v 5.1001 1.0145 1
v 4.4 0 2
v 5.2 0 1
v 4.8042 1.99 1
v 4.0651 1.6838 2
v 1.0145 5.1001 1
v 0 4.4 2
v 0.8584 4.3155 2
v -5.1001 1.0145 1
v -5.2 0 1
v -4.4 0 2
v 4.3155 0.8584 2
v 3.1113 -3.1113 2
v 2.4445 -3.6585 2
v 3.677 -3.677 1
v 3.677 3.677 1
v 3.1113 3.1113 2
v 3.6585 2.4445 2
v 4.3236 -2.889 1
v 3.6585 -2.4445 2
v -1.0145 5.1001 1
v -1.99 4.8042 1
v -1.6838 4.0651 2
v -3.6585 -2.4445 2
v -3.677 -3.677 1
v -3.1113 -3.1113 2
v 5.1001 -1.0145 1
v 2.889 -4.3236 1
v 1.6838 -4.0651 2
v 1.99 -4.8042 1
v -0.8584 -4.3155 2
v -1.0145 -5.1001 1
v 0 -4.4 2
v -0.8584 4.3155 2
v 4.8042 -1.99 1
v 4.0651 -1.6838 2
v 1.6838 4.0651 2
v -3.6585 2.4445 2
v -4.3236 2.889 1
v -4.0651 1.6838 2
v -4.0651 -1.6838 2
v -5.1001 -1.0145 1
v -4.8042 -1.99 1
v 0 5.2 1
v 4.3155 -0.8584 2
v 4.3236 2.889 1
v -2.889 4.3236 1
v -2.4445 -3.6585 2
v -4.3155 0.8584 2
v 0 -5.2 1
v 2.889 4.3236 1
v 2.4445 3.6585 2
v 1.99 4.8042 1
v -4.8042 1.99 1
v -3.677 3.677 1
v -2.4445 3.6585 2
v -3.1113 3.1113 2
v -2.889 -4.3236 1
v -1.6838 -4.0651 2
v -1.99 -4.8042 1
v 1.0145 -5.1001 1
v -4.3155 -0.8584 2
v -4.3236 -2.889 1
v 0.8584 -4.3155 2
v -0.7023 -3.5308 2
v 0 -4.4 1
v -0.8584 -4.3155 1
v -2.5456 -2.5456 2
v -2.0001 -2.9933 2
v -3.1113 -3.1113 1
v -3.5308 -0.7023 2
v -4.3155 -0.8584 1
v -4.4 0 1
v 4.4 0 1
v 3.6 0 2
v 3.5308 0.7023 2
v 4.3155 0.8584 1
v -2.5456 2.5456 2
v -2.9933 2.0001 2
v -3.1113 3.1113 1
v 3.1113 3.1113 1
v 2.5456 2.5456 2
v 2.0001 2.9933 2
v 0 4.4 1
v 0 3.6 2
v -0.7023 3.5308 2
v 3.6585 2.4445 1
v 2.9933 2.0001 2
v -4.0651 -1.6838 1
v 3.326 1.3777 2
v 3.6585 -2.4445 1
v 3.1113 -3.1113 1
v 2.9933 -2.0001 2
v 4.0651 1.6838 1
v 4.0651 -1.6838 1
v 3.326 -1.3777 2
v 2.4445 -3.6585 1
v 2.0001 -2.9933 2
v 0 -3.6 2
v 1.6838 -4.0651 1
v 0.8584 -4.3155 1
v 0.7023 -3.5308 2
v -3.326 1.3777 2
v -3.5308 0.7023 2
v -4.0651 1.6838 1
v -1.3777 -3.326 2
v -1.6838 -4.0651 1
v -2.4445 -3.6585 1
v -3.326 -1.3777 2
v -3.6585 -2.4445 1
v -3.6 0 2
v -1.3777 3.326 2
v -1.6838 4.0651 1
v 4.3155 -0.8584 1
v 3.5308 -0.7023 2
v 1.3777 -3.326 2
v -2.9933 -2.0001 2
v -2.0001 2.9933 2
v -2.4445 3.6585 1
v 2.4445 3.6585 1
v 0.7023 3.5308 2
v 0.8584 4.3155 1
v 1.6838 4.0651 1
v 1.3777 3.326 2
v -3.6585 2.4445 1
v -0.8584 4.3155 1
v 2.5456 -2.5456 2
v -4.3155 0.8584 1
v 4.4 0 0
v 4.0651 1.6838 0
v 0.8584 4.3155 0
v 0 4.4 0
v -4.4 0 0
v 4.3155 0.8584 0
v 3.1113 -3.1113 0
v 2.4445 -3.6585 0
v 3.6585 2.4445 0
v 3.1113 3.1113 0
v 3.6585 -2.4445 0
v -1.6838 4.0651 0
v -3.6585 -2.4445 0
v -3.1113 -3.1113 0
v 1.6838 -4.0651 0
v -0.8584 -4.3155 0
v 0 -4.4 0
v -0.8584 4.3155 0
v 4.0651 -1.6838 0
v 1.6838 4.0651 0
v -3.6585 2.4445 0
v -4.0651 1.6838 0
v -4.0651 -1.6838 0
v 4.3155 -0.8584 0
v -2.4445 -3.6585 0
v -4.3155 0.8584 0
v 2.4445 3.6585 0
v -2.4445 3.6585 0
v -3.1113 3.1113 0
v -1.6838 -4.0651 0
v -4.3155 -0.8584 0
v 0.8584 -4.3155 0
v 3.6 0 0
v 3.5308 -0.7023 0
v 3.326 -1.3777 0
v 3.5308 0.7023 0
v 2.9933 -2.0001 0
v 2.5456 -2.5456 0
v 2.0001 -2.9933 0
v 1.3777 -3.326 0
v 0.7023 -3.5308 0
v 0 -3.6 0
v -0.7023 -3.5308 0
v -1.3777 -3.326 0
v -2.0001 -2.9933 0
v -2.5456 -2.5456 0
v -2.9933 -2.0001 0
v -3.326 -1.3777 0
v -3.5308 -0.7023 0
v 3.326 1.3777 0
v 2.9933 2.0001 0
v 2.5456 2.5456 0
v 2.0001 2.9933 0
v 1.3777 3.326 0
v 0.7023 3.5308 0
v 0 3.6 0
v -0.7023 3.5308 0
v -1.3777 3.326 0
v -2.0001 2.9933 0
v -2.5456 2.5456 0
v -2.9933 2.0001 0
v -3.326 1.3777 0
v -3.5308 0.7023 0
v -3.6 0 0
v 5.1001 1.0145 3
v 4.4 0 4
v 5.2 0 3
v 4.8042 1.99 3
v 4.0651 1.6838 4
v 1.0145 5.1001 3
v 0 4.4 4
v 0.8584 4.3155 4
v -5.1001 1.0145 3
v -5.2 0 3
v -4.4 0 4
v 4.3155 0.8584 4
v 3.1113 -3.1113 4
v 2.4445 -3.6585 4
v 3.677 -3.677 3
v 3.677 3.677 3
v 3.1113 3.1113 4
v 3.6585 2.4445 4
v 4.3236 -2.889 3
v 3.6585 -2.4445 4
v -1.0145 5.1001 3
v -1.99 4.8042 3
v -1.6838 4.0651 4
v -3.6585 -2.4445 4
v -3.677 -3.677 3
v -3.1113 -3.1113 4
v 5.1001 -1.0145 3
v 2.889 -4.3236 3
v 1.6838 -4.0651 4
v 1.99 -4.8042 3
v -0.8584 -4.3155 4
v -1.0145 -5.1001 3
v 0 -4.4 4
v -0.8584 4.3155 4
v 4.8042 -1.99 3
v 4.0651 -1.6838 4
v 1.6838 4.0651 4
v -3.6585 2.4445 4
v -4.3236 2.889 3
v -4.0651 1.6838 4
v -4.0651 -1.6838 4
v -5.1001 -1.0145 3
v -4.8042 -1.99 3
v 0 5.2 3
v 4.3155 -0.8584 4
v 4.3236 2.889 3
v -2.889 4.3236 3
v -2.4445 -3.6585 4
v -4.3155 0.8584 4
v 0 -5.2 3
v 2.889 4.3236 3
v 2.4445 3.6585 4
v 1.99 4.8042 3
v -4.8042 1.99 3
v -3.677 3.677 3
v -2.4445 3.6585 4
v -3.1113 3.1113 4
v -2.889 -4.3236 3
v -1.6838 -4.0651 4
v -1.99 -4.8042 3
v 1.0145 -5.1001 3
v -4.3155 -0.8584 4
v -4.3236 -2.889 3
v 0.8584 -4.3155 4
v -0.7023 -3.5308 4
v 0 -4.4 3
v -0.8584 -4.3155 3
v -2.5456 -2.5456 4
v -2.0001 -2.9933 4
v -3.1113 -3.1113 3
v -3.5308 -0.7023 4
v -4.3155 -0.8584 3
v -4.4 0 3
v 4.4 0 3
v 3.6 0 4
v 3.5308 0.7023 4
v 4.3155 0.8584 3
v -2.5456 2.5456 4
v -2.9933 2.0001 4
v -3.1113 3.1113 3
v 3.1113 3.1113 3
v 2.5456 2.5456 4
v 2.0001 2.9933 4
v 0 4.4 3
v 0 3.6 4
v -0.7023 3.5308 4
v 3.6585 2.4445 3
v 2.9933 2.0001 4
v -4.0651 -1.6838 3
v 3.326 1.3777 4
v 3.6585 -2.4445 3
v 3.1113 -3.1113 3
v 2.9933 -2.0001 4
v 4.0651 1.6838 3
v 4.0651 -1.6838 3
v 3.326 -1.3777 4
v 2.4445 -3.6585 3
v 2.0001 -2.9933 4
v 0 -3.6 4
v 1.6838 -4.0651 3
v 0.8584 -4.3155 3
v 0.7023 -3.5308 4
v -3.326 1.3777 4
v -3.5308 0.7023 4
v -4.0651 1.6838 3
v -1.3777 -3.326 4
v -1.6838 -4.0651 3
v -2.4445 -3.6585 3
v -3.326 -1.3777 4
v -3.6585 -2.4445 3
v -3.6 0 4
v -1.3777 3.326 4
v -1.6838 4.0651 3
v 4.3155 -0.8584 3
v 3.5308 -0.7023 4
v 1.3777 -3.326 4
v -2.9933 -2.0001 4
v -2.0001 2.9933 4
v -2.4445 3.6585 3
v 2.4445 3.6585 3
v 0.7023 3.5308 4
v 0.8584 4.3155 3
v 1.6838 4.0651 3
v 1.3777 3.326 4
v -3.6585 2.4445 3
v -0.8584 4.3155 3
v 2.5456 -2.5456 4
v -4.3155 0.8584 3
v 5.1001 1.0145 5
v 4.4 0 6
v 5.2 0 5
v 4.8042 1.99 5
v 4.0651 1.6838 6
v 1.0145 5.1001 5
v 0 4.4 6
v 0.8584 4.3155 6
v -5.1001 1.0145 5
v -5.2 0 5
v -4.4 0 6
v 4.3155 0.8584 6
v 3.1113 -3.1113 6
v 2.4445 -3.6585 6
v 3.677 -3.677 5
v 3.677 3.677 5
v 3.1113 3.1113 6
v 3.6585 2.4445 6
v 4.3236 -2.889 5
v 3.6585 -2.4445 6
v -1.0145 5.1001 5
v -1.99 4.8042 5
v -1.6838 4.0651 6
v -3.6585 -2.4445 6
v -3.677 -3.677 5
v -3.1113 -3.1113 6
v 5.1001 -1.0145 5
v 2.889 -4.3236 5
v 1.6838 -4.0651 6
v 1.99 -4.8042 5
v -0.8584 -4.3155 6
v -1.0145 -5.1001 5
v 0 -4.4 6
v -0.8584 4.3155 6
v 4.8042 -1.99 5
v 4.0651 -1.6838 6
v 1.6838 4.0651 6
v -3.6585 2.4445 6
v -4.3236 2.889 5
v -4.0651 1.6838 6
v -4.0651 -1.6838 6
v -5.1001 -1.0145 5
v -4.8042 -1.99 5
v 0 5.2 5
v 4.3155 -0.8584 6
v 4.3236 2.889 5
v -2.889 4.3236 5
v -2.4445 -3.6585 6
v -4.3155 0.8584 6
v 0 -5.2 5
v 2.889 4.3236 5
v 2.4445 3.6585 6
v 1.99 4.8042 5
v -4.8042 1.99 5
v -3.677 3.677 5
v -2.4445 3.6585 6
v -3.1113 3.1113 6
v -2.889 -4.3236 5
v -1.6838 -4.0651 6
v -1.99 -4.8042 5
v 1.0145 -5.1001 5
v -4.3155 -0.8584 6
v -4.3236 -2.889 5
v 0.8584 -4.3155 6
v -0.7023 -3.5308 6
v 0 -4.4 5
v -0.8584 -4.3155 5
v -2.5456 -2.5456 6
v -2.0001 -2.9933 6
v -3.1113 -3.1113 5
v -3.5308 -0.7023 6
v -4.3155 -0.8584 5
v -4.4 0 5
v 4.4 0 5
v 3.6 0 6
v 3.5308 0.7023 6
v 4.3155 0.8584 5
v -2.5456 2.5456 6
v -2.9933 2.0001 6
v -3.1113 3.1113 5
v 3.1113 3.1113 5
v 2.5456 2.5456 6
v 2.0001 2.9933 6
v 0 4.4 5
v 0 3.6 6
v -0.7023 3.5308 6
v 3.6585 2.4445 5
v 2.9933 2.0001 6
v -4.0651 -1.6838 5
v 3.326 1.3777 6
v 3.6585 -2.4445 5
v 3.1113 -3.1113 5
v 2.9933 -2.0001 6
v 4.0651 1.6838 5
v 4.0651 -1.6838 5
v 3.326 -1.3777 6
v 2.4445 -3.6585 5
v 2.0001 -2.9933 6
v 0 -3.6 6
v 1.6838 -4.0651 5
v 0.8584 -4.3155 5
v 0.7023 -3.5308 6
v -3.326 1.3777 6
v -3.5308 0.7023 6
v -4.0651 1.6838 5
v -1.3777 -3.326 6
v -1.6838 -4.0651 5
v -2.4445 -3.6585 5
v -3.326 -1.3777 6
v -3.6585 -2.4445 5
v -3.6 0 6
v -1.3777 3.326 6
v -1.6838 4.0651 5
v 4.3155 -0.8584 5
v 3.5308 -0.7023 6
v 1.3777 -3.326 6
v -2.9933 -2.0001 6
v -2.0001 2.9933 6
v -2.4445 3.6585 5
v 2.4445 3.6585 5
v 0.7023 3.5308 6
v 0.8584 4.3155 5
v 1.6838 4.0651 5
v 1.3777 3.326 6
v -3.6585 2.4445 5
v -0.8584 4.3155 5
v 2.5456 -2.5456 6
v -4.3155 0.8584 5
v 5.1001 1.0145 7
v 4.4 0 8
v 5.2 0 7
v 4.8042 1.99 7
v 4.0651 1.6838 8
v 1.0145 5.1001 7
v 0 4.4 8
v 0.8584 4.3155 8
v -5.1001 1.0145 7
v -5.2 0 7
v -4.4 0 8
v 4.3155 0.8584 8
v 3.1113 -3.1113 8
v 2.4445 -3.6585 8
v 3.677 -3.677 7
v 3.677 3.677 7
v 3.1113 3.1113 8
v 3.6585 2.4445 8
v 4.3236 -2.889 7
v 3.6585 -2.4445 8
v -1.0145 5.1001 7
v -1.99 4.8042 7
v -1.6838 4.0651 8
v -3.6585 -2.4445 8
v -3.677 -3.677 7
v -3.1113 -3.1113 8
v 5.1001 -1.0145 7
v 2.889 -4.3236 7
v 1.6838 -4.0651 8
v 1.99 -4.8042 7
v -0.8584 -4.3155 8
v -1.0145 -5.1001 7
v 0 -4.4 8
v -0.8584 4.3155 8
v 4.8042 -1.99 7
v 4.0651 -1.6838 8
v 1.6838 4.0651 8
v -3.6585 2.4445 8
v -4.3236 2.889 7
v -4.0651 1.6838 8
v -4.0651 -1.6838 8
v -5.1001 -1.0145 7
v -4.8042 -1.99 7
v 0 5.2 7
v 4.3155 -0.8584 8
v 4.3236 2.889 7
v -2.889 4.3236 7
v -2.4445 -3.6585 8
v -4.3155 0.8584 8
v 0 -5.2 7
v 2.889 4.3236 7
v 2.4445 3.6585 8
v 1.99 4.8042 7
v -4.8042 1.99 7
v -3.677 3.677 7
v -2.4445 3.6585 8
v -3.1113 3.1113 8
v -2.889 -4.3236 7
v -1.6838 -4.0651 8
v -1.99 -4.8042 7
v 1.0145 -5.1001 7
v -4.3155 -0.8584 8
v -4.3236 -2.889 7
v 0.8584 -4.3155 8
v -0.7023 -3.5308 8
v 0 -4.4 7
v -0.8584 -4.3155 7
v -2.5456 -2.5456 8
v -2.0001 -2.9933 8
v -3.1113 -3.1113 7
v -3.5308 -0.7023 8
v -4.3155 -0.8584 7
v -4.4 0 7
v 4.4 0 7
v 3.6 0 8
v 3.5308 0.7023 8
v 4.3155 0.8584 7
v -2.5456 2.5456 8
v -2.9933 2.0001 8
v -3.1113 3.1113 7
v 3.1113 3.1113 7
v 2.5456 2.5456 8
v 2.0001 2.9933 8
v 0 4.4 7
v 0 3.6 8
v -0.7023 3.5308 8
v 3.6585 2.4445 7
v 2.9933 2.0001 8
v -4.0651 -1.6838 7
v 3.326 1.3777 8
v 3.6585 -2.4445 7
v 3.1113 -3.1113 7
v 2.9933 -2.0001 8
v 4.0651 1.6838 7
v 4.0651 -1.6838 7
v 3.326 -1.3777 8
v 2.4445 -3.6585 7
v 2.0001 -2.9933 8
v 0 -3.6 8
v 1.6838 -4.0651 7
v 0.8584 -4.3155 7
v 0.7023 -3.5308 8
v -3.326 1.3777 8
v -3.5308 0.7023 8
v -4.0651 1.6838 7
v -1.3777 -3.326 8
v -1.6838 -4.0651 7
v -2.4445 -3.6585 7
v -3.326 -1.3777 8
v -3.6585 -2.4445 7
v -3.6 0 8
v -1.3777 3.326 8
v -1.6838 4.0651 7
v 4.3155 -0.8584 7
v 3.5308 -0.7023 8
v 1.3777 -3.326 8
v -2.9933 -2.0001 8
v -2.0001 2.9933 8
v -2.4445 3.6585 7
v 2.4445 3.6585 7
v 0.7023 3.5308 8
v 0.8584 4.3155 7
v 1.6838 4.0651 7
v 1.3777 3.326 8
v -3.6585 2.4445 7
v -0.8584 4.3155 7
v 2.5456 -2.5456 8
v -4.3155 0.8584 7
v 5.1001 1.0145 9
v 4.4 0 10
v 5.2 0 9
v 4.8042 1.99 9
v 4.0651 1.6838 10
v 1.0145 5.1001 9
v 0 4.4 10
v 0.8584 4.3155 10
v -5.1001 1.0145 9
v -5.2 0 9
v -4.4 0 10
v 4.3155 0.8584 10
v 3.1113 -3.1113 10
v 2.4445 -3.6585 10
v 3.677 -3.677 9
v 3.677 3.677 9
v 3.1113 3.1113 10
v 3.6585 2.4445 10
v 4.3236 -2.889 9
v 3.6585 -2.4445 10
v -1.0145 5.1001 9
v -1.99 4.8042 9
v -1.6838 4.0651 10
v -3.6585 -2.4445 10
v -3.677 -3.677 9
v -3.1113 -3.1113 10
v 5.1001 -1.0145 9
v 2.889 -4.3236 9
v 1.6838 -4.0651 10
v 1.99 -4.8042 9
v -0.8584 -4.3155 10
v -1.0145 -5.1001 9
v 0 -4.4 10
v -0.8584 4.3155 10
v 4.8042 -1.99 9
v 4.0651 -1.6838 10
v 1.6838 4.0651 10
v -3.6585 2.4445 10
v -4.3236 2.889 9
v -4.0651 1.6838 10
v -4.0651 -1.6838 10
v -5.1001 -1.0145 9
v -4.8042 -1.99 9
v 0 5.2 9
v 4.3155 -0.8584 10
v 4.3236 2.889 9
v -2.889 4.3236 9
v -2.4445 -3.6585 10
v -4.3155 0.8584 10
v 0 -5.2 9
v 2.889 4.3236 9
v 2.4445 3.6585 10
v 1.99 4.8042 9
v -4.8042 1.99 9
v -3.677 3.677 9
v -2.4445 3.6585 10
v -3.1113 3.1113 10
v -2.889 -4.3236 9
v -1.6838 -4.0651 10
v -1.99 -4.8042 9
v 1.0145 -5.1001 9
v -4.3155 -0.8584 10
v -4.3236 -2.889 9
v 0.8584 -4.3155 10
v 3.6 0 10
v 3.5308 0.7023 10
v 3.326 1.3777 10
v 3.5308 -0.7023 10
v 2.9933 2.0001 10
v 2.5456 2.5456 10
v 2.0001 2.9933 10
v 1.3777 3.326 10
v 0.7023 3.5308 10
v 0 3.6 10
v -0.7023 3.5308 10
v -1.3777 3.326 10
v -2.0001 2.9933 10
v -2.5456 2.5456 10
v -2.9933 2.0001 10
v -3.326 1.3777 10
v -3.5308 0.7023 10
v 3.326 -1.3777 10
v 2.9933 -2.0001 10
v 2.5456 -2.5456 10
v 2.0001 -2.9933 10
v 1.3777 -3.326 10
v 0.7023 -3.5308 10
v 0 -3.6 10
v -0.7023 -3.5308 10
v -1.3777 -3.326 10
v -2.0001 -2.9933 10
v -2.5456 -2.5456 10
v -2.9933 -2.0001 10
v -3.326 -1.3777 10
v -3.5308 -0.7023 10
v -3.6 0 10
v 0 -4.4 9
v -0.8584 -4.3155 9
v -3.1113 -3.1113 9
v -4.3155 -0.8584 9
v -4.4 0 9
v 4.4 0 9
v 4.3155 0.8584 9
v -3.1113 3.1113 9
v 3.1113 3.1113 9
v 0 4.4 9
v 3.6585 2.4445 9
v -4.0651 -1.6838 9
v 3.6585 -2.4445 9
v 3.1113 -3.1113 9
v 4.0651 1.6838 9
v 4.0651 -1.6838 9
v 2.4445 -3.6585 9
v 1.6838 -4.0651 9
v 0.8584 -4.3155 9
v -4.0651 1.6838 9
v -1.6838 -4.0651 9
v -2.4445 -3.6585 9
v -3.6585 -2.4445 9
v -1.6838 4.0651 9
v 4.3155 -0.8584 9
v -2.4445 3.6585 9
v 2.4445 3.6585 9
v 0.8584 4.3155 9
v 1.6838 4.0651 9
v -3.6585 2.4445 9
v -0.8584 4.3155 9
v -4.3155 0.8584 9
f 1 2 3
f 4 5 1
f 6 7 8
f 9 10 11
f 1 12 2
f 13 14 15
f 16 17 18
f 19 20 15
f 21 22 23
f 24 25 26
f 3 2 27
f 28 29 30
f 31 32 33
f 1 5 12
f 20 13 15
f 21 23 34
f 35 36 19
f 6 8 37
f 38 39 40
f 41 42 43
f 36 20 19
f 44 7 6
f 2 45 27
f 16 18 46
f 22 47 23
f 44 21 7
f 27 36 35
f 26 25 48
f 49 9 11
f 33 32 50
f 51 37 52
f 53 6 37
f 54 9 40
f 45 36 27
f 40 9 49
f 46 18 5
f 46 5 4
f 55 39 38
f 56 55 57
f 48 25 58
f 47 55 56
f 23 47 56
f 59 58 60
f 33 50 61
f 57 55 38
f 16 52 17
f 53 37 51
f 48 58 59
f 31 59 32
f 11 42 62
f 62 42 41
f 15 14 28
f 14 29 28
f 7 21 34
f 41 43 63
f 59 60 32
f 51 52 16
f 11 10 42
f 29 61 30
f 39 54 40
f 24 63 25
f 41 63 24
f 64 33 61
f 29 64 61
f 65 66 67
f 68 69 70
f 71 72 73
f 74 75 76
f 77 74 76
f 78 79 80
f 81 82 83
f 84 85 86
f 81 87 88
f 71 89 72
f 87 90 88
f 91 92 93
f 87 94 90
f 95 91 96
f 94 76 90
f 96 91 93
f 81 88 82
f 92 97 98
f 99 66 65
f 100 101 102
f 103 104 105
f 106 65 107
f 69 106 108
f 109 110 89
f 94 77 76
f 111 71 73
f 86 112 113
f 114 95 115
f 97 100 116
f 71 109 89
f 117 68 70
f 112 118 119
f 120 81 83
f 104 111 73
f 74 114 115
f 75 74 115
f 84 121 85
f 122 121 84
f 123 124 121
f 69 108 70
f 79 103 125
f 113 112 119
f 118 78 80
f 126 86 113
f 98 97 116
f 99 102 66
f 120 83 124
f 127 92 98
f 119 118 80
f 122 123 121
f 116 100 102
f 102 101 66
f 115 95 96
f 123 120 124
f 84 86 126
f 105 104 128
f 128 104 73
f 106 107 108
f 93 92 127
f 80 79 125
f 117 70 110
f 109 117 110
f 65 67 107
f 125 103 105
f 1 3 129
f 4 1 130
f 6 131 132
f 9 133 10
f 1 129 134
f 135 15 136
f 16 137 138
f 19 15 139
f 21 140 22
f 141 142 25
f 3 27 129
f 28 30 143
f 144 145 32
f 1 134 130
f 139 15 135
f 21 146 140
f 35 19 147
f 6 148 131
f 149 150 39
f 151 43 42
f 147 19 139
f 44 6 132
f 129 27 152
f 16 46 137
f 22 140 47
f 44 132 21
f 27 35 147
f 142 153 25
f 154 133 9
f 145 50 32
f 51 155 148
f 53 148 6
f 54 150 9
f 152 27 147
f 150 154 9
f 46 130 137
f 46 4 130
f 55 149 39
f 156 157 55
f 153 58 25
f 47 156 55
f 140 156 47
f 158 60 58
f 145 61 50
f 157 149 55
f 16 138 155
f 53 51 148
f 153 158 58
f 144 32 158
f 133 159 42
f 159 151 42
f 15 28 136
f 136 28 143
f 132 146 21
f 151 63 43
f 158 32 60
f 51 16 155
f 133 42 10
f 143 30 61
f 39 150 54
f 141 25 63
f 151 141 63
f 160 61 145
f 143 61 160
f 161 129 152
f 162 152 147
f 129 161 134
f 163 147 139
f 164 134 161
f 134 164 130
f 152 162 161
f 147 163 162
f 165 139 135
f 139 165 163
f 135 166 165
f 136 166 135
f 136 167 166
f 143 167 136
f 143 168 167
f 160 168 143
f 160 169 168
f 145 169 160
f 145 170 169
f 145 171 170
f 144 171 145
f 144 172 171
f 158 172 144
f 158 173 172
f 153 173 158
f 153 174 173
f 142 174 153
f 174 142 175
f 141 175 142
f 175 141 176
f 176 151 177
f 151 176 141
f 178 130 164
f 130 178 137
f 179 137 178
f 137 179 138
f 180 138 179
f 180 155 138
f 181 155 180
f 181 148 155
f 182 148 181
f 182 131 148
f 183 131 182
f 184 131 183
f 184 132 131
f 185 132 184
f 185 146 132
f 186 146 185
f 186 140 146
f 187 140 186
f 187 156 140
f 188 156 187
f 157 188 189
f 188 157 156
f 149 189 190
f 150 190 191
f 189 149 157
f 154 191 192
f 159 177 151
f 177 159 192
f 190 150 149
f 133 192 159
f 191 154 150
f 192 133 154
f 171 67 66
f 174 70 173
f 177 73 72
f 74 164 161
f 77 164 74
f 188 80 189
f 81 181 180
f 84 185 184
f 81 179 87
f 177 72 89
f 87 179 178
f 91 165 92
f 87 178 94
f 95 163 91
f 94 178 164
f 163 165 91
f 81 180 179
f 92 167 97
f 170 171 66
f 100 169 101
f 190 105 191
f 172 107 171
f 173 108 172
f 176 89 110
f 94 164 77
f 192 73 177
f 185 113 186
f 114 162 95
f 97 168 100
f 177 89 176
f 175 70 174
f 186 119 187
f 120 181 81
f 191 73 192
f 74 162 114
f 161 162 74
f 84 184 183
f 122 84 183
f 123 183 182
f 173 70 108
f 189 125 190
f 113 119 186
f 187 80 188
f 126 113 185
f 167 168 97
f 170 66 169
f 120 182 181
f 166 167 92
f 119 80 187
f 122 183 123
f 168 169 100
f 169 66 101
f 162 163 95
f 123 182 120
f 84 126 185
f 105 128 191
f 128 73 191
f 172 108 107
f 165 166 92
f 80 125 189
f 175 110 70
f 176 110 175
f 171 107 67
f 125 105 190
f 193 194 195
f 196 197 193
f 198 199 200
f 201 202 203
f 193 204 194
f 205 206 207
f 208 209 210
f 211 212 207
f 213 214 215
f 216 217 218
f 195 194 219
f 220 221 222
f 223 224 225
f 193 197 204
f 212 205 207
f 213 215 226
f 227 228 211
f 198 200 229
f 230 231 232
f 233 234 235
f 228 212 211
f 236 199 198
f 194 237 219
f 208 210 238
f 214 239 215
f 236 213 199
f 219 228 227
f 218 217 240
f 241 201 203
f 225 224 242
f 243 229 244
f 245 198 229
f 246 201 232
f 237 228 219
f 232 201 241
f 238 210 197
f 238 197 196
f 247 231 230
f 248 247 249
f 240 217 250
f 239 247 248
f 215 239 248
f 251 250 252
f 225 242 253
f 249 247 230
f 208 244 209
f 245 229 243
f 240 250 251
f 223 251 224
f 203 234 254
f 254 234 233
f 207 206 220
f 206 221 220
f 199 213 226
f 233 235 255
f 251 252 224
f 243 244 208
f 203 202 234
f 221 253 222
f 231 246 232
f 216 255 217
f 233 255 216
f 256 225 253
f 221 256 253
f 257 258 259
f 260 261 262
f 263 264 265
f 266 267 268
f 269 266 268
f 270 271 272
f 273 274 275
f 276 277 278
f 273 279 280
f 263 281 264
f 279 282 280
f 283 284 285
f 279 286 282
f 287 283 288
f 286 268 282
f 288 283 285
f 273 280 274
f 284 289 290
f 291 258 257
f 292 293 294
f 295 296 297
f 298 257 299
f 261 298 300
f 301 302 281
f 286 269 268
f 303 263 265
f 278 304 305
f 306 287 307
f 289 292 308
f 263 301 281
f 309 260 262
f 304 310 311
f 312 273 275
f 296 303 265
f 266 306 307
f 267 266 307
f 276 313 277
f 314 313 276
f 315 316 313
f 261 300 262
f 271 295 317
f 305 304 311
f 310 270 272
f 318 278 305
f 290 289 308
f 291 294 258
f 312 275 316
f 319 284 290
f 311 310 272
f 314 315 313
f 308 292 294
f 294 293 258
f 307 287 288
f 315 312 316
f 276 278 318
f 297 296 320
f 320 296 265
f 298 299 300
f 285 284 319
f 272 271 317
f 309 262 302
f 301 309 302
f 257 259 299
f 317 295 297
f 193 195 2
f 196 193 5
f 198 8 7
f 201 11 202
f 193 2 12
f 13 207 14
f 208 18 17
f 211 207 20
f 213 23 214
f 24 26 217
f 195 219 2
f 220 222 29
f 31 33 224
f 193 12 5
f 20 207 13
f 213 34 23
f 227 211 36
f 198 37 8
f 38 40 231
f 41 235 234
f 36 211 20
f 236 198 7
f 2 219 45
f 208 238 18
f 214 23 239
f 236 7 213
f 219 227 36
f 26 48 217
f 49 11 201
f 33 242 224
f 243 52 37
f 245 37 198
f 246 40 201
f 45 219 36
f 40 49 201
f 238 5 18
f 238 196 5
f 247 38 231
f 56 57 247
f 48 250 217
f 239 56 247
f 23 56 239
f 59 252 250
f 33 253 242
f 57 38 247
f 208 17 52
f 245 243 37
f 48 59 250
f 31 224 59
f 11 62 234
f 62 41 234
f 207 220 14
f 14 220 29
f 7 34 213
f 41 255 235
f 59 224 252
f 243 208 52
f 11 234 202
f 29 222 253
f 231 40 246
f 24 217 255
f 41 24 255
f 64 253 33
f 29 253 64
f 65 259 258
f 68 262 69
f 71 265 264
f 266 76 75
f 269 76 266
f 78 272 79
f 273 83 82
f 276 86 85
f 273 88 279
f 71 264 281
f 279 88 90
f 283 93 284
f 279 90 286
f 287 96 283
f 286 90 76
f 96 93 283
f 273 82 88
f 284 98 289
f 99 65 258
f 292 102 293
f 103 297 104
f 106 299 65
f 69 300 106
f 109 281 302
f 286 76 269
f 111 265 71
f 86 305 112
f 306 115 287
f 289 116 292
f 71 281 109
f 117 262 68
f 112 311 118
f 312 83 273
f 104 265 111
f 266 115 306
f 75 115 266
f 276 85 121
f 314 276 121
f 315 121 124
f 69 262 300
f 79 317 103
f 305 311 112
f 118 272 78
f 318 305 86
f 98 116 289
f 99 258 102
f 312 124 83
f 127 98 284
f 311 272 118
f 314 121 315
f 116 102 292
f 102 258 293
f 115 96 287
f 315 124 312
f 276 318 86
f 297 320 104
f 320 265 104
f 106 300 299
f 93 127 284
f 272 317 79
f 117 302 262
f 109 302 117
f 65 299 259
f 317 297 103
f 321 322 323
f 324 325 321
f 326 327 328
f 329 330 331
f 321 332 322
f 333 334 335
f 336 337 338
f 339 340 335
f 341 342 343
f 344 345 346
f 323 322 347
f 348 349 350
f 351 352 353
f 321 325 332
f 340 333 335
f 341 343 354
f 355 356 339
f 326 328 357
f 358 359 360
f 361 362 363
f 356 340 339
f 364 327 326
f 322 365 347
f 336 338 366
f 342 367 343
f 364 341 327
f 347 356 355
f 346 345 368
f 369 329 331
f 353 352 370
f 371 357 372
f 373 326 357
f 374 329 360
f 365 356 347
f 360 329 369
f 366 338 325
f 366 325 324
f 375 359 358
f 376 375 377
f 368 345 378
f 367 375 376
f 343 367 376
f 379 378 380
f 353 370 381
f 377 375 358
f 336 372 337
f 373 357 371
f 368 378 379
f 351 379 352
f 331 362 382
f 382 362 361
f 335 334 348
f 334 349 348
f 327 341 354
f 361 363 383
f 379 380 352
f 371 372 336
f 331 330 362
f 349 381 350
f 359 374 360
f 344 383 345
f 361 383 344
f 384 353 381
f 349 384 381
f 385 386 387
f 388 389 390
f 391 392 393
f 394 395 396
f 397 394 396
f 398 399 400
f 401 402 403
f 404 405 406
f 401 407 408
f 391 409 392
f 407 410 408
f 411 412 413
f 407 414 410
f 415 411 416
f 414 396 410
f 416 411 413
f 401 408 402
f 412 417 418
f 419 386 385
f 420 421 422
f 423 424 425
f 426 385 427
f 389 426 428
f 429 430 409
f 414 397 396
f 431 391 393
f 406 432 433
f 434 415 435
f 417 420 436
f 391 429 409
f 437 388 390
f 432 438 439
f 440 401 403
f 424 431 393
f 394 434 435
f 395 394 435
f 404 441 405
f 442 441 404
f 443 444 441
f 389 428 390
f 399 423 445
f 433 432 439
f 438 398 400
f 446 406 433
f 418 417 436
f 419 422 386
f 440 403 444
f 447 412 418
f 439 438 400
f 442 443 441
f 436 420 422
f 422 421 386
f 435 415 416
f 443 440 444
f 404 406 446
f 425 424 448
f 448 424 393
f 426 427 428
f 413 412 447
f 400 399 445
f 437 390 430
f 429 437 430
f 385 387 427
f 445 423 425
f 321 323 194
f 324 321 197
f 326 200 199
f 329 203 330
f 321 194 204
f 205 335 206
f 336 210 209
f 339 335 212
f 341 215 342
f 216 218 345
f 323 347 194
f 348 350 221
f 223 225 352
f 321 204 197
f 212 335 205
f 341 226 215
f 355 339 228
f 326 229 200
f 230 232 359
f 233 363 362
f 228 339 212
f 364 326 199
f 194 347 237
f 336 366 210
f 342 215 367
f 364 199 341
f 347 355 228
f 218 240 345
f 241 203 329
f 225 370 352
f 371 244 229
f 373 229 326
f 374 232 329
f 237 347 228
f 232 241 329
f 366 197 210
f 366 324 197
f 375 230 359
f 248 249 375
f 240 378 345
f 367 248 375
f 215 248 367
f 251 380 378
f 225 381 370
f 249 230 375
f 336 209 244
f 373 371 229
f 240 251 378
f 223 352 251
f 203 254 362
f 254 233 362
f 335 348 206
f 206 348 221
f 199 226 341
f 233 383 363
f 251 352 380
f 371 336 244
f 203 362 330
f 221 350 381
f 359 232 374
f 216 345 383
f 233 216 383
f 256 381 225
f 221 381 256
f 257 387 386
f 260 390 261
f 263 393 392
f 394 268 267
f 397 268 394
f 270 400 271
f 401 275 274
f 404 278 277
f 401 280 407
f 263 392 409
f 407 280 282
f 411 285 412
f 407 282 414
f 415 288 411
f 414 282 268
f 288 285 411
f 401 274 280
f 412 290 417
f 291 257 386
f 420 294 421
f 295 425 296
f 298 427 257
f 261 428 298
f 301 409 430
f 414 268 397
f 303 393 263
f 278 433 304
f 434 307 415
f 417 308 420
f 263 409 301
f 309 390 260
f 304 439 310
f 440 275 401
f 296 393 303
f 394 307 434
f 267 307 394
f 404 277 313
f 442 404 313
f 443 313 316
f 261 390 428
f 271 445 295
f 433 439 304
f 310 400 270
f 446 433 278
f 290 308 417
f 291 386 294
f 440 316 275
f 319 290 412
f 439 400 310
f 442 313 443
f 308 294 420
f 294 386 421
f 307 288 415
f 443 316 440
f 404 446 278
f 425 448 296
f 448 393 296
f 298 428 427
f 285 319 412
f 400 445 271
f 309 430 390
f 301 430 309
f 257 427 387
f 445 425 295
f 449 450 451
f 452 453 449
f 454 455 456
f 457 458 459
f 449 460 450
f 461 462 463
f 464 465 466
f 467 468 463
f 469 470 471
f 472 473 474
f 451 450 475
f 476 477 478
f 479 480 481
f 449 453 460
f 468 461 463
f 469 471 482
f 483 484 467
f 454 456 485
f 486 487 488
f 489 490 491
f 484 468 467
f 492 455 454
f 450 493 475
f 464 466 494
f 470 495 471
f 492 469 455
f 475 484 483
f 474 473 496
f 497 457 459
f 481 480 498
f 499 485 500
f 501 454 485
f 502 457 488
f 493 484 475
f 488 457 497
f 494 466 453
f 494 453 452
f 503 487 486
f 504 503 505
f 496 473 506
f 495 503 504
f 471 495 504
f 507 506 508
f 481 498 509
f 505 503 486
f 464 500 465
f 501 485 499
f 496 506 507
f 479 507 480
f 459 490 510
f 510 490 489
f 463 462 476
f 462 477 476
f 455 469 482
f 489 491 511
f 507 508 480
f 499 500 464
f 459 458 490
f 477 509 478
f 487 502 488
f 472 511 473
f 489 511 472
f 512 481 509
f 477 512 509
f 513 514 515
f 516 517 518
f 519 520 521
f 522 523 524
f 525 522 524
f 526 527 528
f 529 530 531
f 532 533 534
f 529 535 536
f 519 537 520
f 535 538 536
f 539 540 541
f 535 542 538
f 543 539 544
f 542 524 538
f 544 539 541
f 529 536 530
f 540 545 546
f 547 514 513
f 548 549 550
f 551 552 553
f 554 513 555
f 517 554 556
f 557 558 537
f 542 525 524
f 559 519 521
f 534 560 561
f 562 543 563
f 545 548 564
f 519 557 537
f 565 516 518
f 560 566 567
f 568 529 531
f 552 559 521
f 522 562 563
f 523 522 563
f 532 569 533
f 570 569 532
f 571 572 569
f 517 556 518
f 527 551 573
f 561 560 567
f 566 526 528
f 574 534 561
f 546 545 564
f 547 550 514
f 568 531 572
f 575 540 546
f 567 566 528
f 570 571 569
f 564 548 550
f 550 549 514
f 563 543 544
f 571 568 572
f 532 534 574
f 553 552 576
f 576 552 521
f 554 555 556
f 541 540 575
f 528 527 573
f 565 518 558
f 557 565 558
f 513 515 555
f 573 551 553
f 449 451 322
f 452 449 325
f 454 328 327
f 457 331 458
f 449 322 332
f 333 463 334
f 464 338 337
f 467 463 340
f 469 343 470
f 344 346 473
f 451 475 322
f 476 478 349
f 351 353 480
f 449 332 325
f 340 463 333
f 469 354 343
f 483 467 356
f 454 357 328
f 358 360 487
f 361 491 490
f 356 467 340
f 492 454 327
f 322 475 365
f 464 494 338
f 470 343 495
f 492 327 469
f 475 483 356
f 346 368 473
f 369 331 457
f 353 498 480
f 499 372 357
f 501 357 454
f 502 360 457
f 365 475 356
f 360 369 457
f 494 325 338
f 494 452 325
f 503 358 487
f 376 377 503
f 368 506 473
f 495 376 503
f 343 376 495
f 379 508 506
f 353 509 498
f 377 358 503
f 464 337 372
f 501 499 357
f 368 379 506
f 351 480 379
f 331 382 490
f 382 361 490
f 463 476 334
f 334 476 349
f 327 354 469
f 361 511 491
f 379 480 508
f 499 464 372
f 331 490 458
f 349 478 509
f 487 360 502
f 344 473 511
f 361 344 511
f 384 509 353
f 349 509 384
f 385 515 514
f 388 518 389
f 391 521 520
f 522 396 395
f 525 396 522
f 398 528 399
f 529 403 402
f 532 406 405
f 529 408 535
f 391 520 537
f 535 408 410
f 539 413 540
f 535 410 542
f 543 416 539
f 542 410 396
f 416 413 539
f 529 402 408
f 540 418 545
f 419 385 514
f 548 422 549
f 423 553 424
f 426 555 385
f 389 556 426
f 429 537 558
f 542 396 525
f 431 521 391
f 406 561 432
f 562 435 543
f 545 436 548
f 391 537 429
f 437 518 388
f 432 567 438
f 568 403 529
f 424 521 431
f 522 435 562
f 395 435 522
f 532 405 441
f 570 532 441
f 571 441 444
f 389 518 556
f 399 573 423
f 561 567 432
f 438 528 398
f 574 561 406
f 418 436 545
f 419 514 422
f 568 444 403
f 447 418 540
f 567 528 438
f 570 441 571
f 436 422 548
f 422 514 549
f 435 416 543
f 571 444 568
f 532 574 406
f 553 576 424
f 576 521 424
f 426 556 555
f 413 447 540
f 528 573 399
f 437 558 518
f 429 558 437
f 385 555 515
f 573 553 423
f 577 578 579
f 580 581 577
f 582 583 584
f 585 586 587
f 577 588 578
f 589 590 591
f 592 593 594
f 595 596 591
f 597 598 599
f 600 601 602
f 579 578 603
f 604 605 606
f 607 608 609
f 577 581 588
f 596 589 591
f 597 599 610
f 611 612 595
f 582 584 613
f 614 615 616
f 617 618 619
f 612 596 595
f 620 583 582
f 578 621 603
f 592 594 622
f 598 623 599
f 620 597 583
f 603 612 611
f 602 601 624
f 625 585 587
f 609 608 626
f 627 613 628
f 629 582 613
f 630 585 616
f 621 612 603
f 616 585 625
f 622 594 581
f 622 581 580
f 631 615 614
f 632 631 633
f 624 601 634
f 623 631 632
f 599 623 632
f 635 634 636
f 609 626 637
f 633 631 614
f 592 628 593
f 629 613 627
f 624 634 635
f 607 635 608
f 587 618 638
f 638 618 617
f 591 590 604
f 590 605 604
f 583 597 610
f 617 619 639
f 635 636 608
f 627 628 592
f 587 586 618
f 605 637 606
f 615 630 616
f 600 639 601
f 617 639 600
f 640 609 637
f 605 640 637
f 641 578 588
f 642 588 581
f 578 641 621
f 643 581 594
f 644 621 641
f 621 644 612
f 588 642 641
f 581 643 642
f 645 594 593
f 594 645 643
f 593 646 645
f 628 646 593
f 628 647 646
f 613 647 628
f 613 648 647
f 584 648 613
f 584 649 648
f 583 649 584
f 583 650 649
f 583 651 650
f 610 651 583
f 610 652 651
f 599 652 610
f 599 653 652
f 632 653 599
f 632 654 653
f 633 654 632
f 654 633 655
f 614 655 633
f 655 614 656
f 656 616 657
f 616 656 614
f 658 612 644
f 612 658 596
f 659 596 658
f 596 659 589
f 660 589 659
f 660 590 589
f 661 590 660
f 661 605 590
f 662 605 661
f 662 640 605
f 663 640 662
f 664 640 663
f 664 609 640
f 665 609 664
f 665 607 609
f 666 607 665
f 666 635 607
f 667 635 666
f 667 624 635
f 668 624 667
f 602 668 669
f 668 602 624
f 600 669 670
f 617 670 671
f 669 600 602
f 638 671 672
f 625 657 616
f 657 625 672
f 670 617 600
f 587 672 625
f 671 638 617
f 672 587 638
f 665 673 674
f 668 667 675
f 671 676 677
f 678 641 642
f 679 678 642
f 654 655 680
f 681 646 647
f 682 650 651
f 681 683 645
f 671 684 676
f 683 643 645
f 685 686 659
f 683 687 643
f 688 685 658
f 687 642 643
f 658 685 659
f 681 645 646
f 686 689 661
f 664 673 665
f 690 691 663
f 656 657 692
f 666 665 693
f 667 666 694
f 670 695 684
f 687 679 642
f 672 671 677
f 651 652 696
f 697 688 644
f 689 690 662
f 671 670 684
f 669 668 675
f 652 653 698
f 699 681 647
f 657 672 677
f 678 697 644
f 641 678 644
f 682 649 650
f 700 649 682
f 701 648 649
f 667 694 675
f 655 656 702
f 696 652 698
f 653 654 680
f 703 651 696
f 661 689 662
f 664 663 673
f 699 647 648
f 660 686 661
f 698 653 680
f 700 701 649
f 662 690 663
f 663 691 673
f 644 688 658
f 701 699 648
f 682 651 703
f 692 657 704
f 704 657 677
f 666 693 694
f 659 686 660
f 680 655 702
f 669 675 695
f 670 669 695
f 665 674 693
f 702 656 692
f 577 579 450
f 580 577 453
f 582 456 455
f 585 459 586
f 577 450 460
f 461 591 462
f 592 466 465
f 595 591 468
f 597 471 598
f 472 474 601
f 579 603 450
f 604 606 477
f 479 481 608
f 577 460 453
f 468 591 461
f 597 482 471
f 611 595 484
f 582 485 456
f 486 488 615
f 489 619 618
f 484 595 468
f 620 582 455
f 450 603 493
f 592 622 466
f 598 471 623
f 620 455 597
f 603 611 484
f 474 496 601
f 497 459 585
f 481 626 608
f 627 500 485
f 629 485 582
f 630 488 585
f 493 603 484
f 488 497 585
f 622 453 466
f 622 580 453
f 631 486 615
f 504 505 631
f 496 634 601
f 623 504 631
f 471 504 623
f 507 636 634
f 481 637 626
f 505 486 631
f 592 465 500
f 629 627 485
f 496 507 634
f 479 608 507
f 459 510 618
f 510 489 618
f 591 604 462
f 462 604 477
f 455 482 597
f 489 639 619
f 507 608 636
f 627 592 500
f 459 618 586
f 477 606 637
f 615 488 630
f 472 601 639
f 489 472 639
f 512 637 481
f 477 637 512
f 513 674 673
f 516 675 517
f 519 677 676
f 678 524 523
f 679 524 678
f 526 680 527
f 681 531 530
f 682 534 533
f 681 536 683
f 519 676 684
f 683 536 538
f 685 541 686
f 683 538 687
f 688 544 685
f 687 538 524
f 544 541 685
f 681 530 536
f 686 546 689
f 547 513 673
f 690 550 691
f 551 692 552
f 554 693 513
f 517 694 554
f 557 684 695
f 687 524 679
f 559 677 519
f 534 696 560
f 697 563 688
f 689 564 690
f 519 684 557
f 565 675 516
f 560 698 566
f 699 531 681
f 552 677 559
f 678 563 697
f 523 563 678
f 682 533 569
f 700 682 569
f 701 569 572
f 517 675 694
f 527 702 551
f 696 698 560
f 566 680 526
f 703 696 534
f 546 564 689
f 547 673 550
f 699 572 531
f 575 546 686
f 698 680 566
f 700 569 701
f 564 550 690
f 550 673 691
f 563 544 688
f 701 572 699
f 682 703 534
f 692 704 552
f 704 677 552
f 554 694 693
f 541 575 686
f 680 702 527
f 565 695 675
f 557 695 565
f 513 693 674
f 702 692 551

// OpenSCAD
// file: tpu_springs.scad
// TPU spring

//$fn=32;

module hollowCylinder(od, id, h, thick) {
    assert(id>thick*2);
    difference() {
        // Outer wall
        cylinder(d1=od, d2=id+thick*2, h);
        // Inner wall
        cylinder(d1=od-thick*2, d2=id, h);
    }
}


module rib(od, id, h, thick) {
    translate([0,0,h/2]) {
        hollowCylinder(od,id,h/2,thick);
        mirror([0,0,1])
        hollowCylinder(od,id,h/2,thick);
    }
}

module tpuSpring(od, id, h, thick, num_ribs) {
    rib_h = h/num_ribs;
    for (i=[0:num_ribs-1]) {
        translate([0,0,i*rib_h])
        rib(od, id, rib_h, thick);
    }
}
//tpuSpring(20, 10, 50, 2, 10);
// file: fillets.scad
// Fillets


// Creates a 3D fillet using rotate_extrude.
// Parameters:
//   fillet_rad — fillet radius
//   center_rad — distance from rotation center
//   inward     — mirror horizontally (true = inward, false = outward)
//   upward     — mirror vertically (true = upward, false = downward)
//   scl        — vertical scale factor
module fillet(fillet_rad, center_rad, inward = true, upward = true, scl = 1.0) {
    // Determine mirror axes
    mirror_vec = [
        inward ? 1 : 0,   // mirror X if inward
        upward ? 0 : 1    // mirror Y if downward
    ];

    // Assumes $fn is set externally
    scale([1, 1, scl])
    rotate_extrude()
    translate([center_rad, 0])
    translate([fillet_rad / 2, fillet_rad / 2])
    mirror(mirror_vec)
    translate([-fillet_rad / 2, -fillet_rad / 2])
    intersection() {
        difference() {
            square(fillet_rad * 2, center = true);
            circle(r = fillet_rad);
        }
        square(fillet_rad);
    }
}

// Example usage
fillet(2, 2, inward = false, upward = false, scl = 0.5);


//newCircularInwardFillet3D(2, 2, up=true, step=32, scl=0.5);
// main file
// Ender 3 Pro Pen Plotter Tool

use <fillets.scad>;
use <tpu_springs.scad>;

$fn=32;

ptfe_dia = 4.21;
spring_inner_dia = 6.4;//7.0; // ~0.1 less than actual
pen_shaft_dia = 3.22+0.4; // Actual was ~2.96, but we want free sliding
pen_insert_dia = 4.1; // Actual was ~3.93, but we don't want too tight
pen_insert_len = 9.55;
pen_head_dia = 5.65;
desired_spring_len = 10.0;//16.0; // Force felt good here
min_spring_len = 4.5;//7.0; // As far as we're comfortable
rod_dia = 2.15+0.4; // Actual was 2.0
min_rod_len = (49.9-2.9)/2; // The total length we have to work with (try for less?)

m3_shaft_len = 10.0;
m3_shaft_dia = 3.0;
m3_head_dia = 5.3;
m3_head_len = 3.0+10.0;

wall_thick = 1.6;
rounding = 3.0;
fillet_rad = 1.0;
lid_unoffset = 3.0;
screw_spot_len = m3_shaft_len;
lid_extra_offset = 1.5;

mount_hole_bed_dist = 45.5;
pen_head_len = 10.0;
pen_out_dist = pen_head_len-wall_thick;
pen_squish_amount = 2.0;
mount_hole_rod_dia = 4.7;
mount_screw_hole_dist=14.4;
mount_hole_rod_len = 4.5;
//screw_hole_dia=3.0;


num_rods = 3;

slider_case_spacing = 0.4;

slider_dia = 26.0;
slider_len = min_rod_len-desired_spring_len-2*wall_thick;
//echo(slider_len);

//#linear_extrude(slider_len+2)
//circle(d=8.6);

module sliderSolid2D(unoffset=0.0) {
    offset(rounding-unoffset) offset(-rounding+unoffset)
    circle(d=slider_dia, $fn=num_rods);
}

module ptfeHoles2D() {
    for (i=[0:num_rods-1]) {
        rotate([0,0,i*360/num_rods])
        translate([slider_dia/4,0])
        circle(d=ptfe_dia);
    }
}

module rodHoles2D() {
    for (i=[0:num_rods-1]) {
        rotate([0,0,i*360/num_rods])
        translate([slider_dia/4,0])
        circle(d=rod_dia);
    }
}

module penHole2D() {
    circle(d=pen_insert_dia);
}

module sliderLower3D() {
    linear_extrude(pen_insert_len)
    difference() {
        sliderSolid2D();
        ptfeHoles2D();
        circle(d=pen_insert_dia);
    }
    fil_rad = pen_insert_dia/2-pen_shaft_dia/2;
    translate([0,0,pen_insert_len-fil_rad])
    fillet(fil_rad, pen_shaft_dia/2, false, true);
    //#fillet(pen_insert_dia-pen_shaft_dia, pen_shaft_dia, false, true);
}
//sliderLower3D();

module sliderUpper3D() {
    linear_extrude(slider_len-pen_insert_len)
    difference() {
        sliderSolid2D();
        ptfeHoles2D();
        circle(d=pen_shaft_dia);
    }
}

module sliderSpringNub() {
    linear_extrude(min_spring_len/2)
    difference() {
        circle(d=spring_inner_dia);
        circle(d=pen_shaft_dia);
    }
    fillet(fillet_rad, spring_inner_dia/2, true, false);
}

module slider3D() {
    translate([0,0,slider_len])
    sliderSpringNub();
    translate([0,0,pen_insert_len])
    sliderUpper3D();
    sliderLower3D();
}
//translate([0,0,wall_thick])
//slider3D();

module sliderCaseSolid2D(unoffset=0.0) {
    offset(wall_thick+slider_case_spacing)
    sliderSolid2D(unoffset);
}
//#sliderCaseSolid2D();

module sliderCaseWalls2D() {
    difference() {
        sliderCaseSolid2D();
        offset(-wall_thick)
        sliderCaseSolid2D();
    }
}
//#sliderCaseWalls2D();

module sliderCaseScrewSpots() {
    translate([0,0,min_rod_len-wall_thick-screw_spot_len]) {
        hull() {
            linear_extrude(screw_spot_len)
            sliderCaseSolid2D(lid_unoffset);
            translate([0,0,-lid_unoffset])
            linear_extrude(0.01)
            sliderCaseSolid2D();
        }
        hull() {
            translate([0,0,-0.01+screw_spot_len])
            linear_extrude(0.01)
            offset(lid_extra_offset)
            sliderCaseSolid2D(lid_unoffset);
            translate([0,0,-0.01+screw_spot_len-lid_extra_offset])
            linear_extrude(0.01)
            sliderCaseSolid2D(lid_unoffset);
        }
    }
}

module m3_screw() {
    translate([0,0,-m3_shaft_len])
    union() {
    translate([0,0,m3_shaft_len])
    linear_extrude(m3_head_len)
    circle(m3_head_dia/2);
    linear_extrude(m3_shaft_len)
    circle(m3_shaft_dia/2);
    }
}
//translate([20,0,0])
//m3_screw();

module screwHoles() {
    for (i=[0:num_rods-1]) {
        rotate([0,0,i*360/num_rods])
        translate([slider_dia/2,0,min_rod_len])//-wall_thick/2])
        m3_screw();
    }
}
//screwHoles();

module screwHoles2D() {
    for (i=[0:num_rods-1]) {
        rotate([0,0,i*360/num_rods])
        translate([slider_dia/2,0])//-wall_thick/2])
        circle(d=m3_shaft_dia);
    }
}

module sliderCase3D() {
    linear_extrude(wall_thick)
    sliderCaseSolid2D();
    linear_extrude(min_rod_len-wall_thick)
    sliderCaseWalls2D();
    sliderCaseScrewSpots();
}
//#sliderCase3D();

module sliderCaseCut3D() {
    difference() {
        sliderCase3D();
        translate([0,0,wall_thick])
        linear_extrude(min_rod_len)
        offset(-wall_thick)
        sliderCaseSolid2D();
        screwHoles();
        linear_extrude(wall_thick) {
            rodHoles2D();
            circle(d=pen_head_dia);
        }
    }
}
//#sliderCaseCut3D();

module sliderCaseLid2D() {
    offset(lid_extra_offset)
    sliderCaseSolid2D(lid_unoffset);
}

module cutSliderCaseLid2D() {
    difference() {
        sliderCaseLid2D();
        rodHoles2D();
    }
}

module sliderCaseLid3D() {
    linear_extrude(wall_thick)
    cutSliderCaseLid2D();

    //translate([0,0,-min_spring_len/2]) {
    rotate([180,0,0]) {
        cylinder(d=spring_inner_dia, h=min_spring_len/2);
        fillet(fillet_rad, spring_inner_dia/2, true, false);
    }
}

module cutSliderCaseLid3D() {
    difference() {
        translate([0,0,min_rod_len-wall_thick])
        sliderCaseLid3D();
        translate([0,0,min_rod_len-wall_thick-min_spring_len/2])
        linear_extrude(wall_thick+min_spring_len/2)
        circle(d=pen_shaft_dia);
        screwHoles();
    }
}
//cutSliderCaseLid3D();

//$fn=4;
module printableSpring() {
    #tpuSpring(spring_inner_dia+4, spring_inner_dia+0.8, desired_spring_len, 0.8, 5);
}
printableSpring();

module completeAssembly() {
    difference() {
        union() {
            #sliderCaseCut3D();
            color("orange")
            #cutSliderCaseLid3D();
            color("yellow")
            translate([0,0,wall_thick])
            slider3D();
            translate([0,0,wall_thick+slider_len])
            printableSpring();
        }
        cube(150);
    }
}
//completeAssembly();
//tpuSpring(spring_inner_dia+3, spring_inner_dia, desired_spring_len, 0.8, 5);

module printable() {
    sliderCaseCut3D();

    translate([-slider_dia, 0, min_rod_len])
    rotate([180,0,180])
    cutSliderCaseLid3D();
    translate([slider_dia/2, slider_dia, 0])
    rotate([0,0,60])
    slider3D();
}
//printable();
